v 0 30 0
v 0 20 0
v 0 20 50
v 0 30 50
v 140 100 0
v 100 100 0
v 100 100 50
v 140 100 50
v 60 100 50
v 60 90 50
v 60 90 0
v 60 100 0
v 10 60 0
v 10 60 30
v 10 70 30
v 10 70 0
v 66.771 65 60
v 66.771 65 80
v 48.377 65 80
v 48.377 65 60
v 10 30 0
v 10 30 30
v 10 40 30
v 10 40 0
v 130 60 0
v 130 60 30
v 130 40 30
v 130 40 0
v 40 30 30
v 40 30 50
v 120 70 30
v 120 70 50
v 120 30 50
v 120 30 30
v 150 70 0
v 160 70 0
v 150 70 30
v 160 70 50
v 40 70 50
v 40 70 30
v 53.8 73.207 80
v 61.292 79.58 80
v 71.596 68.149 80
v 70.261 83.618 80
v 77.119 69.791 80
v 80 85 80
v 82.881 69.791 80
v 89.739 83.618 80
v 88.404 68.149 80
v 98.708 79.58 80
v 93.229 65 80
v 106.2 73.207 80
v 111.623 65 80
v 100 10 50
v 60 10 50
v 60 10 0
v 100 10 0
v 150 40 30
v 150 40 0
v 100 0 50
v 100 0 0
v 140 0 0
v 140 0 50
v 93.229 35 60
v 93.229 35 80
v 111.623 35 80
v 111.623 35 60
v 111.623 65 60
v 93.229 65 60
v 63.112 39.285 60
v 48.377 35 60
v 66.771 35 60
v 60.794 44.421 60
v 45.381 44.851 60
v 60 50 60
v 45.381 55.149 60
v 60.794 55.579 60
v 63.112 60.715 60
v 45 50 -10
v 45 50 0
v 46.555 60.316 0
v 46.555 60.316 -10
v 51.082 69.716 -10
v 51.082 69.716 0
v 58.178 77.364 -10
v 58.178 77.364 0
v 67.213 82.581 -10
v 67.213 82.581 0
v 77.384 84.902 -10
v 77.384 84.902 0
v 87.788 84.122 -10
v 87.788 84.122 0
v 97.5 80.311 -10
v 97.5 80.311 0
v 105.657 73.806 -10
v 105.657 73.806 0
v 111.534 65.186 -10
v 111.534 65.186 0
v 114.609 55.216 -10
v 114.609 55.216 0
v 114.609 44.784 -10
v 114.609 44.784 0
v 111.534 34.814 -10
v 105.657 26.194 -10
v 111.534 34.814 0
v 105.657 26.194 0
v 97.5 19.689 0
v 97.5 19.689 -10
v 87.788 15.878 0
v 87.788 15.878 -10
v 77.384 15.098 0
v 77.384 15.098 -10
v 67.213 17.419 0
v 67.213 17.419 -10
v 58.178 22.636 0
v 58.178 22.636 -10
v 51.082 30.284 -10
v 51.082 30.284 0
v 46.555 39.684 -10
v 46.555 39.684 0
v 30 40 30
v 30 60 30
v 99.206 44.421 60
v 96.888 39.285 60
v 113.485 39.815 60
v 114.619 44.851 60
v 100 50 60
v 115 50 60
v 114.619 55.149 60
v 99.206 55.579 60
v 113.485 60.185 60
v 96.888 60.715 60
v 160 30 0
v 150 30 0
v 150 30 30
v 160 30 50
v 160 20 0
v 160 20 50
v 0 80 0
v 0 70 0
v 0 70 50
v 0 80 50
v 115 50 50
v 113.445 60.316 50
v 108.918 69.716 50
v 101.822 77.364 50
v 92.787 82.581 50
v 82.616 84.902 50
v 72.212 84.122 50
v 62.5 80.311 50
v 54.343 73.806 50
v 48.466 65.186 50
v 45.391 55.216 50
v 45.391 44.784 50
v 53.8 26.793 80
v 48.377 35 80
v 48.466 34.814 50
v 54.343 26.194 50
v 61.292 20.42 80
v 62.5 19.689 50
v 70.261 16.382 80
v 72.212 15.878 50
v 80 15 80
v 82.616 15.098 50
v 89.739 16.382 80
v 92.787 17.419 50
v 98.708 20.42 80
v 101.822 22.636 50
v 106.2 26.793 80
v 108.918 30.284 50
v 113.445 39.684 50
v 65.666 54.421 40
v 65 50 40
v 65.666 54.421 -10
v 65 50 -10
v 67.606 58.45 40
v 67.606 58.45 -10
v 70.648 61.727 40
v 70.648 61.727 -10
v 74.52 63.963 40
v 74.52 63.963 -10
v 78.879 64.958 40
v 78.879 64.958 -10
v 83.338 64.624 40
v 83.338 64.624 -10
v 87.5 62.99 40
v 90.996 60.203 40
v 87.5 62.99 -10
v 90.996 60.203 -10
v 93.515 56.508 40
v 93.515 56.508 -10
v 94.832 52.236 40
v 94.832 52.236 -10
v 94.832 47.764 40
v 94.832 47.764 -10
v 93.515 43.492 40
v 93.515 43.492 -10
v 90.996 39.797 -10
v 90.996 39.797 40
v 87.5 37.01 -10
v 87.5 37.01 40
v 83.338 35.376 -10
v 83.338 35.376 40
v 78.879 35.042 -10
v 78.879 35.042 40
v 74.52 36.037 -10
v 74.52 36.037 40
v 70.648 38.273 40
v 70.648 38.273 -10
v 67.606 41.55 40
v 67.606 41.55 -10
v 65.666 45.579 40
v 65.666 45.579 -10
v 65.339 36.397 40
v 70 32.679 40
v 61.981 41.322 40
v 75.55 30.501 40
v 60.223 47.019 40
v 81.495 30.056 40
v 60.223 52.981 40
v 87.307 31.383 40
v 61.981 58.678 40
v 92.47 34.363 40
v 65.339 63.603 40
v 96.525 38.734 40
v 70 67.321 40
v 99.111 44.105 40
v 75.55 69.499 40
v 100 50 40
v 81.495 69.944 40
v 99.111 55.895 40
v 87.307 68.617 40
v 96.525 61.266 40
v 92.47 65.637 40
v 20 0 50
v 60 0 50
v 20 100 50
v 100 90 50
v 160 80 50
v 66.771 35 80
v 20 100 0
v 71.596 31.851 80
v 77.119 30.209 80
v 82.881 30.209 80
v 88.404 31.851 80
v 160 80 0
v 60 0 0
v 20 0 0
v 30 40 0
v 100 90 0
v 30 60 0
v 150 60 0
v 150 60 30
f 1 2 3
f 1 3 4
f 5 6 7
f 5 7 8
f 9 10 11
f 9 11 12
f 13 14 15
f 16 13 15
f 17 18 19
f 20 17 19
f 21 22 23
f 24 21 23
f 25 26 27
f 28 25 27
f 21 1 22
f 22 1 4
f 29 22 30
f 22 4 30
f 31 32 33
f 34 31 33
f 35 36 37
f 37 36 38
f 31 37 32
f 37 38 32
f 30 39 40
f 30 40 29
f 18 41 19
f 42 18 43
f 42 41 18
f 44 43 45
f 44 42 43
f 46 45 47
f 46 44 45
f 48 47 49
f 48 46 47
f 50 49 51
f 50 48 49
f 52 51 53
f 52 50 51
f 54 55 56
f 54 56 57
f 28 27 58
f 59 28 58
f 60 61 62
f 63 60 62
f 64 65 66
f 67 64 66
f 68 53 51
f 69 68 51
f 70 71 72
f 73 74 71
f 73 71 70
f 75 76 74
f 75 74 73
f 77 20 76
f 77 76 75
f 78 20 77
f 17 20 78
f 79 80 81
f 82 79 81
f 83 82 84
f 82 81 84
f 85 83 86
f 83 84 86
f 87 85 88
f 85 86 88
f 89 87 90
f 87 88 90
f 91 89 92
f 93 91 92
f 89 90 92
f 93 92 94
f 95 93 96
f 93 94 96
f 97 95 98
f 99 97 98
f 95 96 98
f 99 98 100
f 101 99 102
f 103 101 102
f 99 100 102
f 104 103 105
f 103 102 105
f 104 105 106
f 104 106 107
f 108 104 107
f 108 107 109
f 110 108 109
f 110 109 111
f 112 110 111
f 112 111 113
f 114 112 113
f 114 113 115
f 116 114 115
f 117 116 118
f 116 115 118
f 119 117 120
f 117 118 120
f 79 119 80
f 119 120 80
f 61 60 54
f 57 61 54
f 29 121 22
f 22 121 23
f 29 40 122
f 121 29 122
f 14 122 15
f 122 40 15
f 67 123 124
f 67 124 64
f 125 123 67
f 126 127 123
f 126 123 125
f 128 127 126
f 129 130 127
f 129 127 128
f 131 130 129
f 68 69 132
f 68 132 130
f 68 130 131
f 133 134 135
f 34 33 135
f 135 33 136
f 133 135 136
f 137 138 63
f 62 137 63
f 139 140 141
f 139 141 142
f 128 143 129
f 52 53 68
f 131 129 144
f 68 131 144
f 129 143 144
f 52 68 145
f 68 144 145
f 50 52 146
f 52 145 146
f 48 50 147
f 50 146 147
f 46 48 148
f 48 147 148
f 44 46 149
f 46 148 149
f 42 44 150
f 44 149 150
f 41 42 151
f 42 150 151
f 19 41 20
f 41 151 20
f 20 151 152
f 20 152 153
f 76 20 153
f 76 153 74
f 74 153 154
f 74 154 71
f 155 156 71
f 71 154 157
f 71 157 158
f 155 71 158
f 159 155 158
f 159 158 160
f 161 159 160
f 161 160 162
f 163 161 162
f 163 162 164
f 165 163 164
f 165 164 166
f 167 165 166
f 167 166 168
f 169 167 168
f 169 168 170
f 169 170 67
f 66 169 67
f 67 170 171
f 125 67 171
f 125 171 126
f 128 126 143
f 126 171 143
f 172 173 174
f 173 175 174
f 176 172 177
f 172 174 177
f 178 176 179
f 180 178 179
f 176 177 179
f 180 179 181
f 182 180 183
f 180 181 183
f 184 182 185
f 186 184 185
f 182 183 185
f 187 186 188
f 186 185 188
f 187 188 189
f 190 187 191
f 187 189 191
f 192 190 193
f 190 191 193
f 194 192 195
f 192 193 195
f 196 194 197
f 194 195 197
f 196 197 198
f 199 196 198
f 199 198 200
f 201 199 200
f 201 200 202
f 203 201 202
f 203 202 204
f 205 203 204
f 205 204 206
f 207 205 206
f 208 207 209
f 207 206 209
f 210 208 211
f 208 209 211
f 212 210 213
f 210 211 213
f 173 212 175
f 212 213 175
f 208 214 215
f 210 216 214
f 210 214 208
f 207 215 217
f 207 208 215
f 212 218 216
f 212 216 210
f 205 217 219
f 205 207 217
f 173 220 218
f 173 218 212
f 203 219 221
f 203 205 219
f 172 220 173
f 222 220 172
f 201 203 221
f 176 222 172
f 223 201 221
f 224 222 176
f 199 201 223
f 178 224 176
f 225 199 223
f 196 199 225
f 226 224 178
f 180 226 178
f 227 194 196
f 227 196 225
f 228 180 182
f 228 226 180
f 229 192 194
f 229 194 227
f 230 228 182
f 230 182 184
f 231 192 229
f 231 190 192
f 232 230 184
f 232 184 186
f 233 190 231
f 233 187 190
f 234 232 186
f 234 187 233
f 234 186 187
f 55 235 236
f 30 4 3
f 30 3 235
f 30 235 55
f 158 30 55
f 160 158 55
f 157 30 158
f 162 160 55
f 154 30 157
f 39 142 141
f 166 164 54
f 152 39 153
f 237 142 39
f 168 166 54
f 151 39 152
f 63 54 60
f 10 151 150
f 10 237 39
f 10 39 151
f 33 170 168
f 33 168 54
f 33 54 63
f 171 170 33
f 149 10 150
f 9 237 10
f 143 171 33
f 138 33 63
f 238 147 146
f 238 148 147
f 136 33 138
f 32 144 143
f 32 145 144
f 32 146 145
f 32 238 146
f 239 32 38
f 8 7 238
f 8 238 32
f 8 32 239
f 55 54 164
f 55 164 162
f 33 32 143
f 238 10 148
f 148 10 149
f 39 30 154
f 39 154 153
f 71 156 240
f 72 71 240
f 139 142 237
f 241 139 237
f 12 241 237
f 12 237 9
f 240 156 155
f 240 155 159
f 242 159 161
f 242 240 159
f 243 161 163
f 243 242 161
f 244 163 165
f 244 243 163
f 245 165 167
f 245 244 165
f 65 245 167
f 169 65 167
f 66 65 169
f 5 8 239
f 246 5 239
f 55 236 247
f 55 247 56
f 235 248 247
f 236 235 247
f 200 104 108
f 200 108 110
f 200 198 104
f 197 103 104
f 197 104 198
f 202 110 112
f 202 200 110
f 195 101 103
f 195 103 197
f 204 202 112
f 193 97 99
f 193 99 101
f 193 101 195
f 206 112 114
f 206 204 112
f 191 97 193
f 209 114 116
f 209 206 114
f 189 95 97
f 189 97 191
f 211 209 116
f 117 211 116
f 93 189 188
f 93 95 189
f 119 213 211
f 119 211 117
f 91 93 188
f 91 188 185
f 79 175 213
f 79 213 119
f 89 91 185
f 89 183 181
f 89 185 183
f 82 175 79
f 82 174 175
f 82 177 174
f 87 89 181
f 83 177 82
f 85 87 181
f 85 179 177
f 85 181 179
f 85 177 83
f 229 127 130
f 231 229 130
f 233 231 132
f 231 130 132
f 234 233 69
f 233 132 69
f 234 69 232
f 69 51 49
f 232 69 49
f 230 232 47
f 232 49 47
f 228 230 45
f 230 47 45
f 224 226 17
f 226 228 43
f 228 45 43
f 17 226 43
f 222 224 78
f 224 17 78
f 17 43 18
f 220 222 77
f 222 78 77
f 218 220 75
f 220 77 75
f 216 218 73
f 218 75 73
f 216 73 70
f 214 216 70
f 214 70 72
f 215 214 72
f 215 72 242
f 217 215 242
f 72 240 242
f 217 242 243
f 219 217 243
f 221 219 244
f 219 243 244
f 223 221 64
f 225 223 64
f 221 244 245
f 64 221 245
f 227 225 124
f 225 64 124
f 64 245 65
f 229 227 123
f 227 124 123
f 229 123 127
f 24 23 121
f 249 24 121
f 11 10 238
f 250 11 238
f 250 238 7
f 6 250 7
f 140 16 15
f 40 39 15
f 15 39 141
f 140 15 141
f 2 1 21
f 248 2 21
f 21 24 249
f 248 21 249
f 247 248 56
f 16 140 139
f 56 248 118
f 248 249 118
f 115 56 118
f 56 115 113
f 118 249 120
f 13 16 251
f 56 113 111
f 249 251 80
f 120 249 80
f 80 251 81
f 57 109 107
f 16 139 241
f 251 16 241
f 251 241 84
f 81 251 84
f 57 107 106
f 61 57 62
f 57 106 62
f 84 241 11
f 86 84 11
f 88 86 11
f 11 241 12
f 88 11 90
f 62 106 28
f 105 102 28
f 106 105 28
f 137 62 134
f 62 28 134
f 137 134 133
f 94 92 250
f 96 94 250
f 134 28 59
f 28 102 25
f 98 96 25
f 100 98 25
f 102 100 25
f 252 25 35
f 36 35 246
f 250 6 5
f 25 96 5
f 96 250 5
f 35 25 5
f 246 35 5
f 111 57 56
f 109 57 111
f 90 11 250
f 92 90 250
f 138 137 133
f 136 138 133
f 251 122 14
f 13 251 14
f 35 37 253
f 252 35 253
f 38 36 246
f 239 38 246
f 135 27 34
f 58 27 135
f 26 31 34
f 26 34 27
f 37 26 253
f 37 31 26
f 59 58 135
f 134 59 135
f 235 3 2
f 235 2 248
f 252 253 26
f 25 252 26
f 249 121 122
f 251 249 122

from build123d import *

# Parameters (mm, degrees)
SKETCH1_W           = 160
SKETCH1_H           = 100
BOSS_EXTRUDE2_DEPTH = 50
CUT_EXTRUDE2_DEPTH  = 50
CUT_EXTRUDE3_DEPTH  = 50
CUT_EXTRUDE4_DEPTH  = 20
CUT_EXTRUDE5_DEPTH  = 20
SKETCH8_W           = 40
SKETCH8_H           = 10
CUT_EXTRUDE6_DEPTH  = 125
SKETCH9_R           = 35
BOSS_EXTRUDE3_DEPTH = 10
SKETCH10_R          = 15
CUT_EXTRUDE8_DEPTH  = 123
SKETCH11_R          = 35
BOSS_EXTRUDE4_DEPTH = 30
SKETCH12_R          = 15
CUT_EXTRUDE9_DEPTH  = 30
SKETCH13_R          = 20
CUT_EXTRUDE10_DEPTH = 30
CUT_EXTRUDE11_DEPTH = 20
SKETCH15_R          = 20
SKETCH15_R_2        = 15
CUT_EXTRUDE12_DEPTH = 10


with BuildPart() as part:
    # Sketch1 → Boss-Extrude2 (new body)
    with BuildSketch(Plane.XY):
        with Locations((80, 50)):
            Rectangle(SKETCH1_W, SKETCH1_H)
    extrude(amount=BOSS_EXTRUDE2_DEPTH)

    # Sketch4 → Cut-Extrude2 (cut)
    with BuildSketch(Plane.XY.offset(50)):
        Polygon((0, 80), (20, 100), (0, 100), align=None)
        Polygon((0, 20), (20, 0), (0, 0), align=None)
        Polygon((140, 100), (160, 80), (160, 100), align=None)
        Polygon((160, 20), (140, 0), (160, 0), align=None)
    extrude(amount=-CUT_EXTRUDE2_DEPTH, mode=Mode.SUBTRACT)

    # Sketch5 → Cut-Extrude3 (cut)
    with BuildSketch(Plane.XY.offset(50)):
        Polygon((10, 70), (0, 70), (0, 30), (10, 30), (10, 40), (30, 40), (30, 60), (10, 60), align=None)
        Polygon((160, 30), (160, 70), (150, 70), (150, 60), (130, 60), (130, 40), (150, 40), (150, 30), align=None)
    extrude(amount=-CUT_EXTRUDE3_DEPTH, mode=Mode.SUBTRACT)

    # Sketch6 → Cut-Extrude4 (cut)
    with BuildSketch(Plane.XY.offset(50)):
        Polygon((10, 70), (40, 70), (40, 30), (10, 30), (10, 40), (30, 40), (30, 60), (10, 60), align=None)
    extrude(amount=-CUT_EXTRUDE4_DEPTH, mode=Mode.SUBTRACT)

    # Sketch7 → Cut-Extrude5 (cut)
    with BuildSketch(Plane.XY.offset(50)):
        Polygon((150, 70), (120, 70), (120, 30), (150, 30), (150, 40), (130, 40), (130, 60), (150, 60), align=None)
    extrude(amount=-CUT_EXTRUDE5_DEPTH, mode=Mode.SUBTRACT)

    # Sketch8 → Cut-Extrude6 (cut)
    with BuildSketch(Plane.XY.offset(50)):
        with Locations((80, 95)):
            Rectangle(SKETCH8_W, SKETCH8_H)
        with Locations((80, 5)):
            Rectangle(SKETCH8_W, SKETCH8_H)
    extrude(amount=-CUT_EXTRUDE6_DEPTH, mode=Mode.SUBTRACT)

    # Sketch9 → Boss-Extrude3 (add)
    with BuildSketch(Plane(origin=(0, 0, 0), x_dir=(-1, 0, 0), z_dir=(0, 0, -1))):
        with Locations((-80, 50)):
            Circle(SKETCH9_R)
    extrude(amount=BOSS_EXTRUDE3_DEPTH)

    # Sketch10 → Cut-Extrude8 (cut)
    with BuildSketch(Plane(origin=(0, 0, -10), x_dir=(-1, 0, 0), z_dir=(0, 0, -1))):
        with Locations((-80, 50)):
            Circle(SKETCH10_R)
    extrude(amount=-CUT_EXTRUDE8_DEPTH, mode=Mode.SUBTRACT)

    # Sketch11 → Boss-Extrude4 (add)
    with BuildSketch(Plane.XY.offset(50)):
        with Locations((80, 50)):
            Circle(SKETCH11_R)
    extrude(amount=BOSS_EXTRUDE4_DEPTH)

    # Sketch12 → Cut-Extrude9 (cut)
    with BuildSketch(Plane(origin=(0, 0, 50), x_dir=(-1, 0, 0), z_dir=(0, 0, -1))):
        with Locations((-80, 50)):
            Circle(SKETCH12_R)
    extrude(amount=-CUT_EXTRUDE9_DEPTH, mode=Mode.SUBTRACT)

    # Sketch13 → Cut-Extrude10 (cut)
    with BuildSketch(Plane.XY.offset(80)):
        with Locations((80, 50)):
            Circle(SKETCH13_R)
    extrude(amount=-CUT_EXTRUDE10_DEPTH, mode=Mode.SUBTRACT)

    # Sketch14 → Cut-Extrude11 (cut)
    with BuildSketch(Plane.XY.offset(80)):
        with BuildLine():
            ThreePointArc((66.771243445, 35), (60, 50), (66.771243445, 65))
            Line((66.771243445, 65), (48.377223398, 65))
            ThreePointArc((48.377223398, 65), (45, 50), (48.377223398, 35))
            Line((48.377223398, 35), (66.771243445, 35))
        make_face()
        with BuildLine():
            Line((111.622776602, 65), (93.228756555, 65))
            ThreePointArc((93.228756555, 65), (98.228756555, 58.228756555), (100, 50))
            ThreePointArc((100, 50), (98.228756555, 41.771243445), (93.228756555, 35))
            Line((93.228756555, 35), (111.622776602, 35))
            ThreePointArc((111.622776602, 35), (114.145257219, 42.312255892), (115, 50))
            ThreePointArc((115, 50), (114.145257219, 57.687744108), (111.622776602, 65))
        make_face()
    extrude(amount=-CUT_EXTRUDE11_DEPTH, mode=Mode.SUBTRACT)

    # Sketch15 → Cut-Extrude12 (cut)
    with BuildSketch(Plane.XY.offset(50)):
        with Locations((80, 50)):
            Circle(SKETCH15_R)
        with Locations((80, 50)):
            Circle(SKETCH15_R_2, mode=Mode.SUBTRACT)
    extrude(amount=-CUT_EXTRUDE12_DEPTH, mode=Mode.SUBTRACT)


solid = part.part
